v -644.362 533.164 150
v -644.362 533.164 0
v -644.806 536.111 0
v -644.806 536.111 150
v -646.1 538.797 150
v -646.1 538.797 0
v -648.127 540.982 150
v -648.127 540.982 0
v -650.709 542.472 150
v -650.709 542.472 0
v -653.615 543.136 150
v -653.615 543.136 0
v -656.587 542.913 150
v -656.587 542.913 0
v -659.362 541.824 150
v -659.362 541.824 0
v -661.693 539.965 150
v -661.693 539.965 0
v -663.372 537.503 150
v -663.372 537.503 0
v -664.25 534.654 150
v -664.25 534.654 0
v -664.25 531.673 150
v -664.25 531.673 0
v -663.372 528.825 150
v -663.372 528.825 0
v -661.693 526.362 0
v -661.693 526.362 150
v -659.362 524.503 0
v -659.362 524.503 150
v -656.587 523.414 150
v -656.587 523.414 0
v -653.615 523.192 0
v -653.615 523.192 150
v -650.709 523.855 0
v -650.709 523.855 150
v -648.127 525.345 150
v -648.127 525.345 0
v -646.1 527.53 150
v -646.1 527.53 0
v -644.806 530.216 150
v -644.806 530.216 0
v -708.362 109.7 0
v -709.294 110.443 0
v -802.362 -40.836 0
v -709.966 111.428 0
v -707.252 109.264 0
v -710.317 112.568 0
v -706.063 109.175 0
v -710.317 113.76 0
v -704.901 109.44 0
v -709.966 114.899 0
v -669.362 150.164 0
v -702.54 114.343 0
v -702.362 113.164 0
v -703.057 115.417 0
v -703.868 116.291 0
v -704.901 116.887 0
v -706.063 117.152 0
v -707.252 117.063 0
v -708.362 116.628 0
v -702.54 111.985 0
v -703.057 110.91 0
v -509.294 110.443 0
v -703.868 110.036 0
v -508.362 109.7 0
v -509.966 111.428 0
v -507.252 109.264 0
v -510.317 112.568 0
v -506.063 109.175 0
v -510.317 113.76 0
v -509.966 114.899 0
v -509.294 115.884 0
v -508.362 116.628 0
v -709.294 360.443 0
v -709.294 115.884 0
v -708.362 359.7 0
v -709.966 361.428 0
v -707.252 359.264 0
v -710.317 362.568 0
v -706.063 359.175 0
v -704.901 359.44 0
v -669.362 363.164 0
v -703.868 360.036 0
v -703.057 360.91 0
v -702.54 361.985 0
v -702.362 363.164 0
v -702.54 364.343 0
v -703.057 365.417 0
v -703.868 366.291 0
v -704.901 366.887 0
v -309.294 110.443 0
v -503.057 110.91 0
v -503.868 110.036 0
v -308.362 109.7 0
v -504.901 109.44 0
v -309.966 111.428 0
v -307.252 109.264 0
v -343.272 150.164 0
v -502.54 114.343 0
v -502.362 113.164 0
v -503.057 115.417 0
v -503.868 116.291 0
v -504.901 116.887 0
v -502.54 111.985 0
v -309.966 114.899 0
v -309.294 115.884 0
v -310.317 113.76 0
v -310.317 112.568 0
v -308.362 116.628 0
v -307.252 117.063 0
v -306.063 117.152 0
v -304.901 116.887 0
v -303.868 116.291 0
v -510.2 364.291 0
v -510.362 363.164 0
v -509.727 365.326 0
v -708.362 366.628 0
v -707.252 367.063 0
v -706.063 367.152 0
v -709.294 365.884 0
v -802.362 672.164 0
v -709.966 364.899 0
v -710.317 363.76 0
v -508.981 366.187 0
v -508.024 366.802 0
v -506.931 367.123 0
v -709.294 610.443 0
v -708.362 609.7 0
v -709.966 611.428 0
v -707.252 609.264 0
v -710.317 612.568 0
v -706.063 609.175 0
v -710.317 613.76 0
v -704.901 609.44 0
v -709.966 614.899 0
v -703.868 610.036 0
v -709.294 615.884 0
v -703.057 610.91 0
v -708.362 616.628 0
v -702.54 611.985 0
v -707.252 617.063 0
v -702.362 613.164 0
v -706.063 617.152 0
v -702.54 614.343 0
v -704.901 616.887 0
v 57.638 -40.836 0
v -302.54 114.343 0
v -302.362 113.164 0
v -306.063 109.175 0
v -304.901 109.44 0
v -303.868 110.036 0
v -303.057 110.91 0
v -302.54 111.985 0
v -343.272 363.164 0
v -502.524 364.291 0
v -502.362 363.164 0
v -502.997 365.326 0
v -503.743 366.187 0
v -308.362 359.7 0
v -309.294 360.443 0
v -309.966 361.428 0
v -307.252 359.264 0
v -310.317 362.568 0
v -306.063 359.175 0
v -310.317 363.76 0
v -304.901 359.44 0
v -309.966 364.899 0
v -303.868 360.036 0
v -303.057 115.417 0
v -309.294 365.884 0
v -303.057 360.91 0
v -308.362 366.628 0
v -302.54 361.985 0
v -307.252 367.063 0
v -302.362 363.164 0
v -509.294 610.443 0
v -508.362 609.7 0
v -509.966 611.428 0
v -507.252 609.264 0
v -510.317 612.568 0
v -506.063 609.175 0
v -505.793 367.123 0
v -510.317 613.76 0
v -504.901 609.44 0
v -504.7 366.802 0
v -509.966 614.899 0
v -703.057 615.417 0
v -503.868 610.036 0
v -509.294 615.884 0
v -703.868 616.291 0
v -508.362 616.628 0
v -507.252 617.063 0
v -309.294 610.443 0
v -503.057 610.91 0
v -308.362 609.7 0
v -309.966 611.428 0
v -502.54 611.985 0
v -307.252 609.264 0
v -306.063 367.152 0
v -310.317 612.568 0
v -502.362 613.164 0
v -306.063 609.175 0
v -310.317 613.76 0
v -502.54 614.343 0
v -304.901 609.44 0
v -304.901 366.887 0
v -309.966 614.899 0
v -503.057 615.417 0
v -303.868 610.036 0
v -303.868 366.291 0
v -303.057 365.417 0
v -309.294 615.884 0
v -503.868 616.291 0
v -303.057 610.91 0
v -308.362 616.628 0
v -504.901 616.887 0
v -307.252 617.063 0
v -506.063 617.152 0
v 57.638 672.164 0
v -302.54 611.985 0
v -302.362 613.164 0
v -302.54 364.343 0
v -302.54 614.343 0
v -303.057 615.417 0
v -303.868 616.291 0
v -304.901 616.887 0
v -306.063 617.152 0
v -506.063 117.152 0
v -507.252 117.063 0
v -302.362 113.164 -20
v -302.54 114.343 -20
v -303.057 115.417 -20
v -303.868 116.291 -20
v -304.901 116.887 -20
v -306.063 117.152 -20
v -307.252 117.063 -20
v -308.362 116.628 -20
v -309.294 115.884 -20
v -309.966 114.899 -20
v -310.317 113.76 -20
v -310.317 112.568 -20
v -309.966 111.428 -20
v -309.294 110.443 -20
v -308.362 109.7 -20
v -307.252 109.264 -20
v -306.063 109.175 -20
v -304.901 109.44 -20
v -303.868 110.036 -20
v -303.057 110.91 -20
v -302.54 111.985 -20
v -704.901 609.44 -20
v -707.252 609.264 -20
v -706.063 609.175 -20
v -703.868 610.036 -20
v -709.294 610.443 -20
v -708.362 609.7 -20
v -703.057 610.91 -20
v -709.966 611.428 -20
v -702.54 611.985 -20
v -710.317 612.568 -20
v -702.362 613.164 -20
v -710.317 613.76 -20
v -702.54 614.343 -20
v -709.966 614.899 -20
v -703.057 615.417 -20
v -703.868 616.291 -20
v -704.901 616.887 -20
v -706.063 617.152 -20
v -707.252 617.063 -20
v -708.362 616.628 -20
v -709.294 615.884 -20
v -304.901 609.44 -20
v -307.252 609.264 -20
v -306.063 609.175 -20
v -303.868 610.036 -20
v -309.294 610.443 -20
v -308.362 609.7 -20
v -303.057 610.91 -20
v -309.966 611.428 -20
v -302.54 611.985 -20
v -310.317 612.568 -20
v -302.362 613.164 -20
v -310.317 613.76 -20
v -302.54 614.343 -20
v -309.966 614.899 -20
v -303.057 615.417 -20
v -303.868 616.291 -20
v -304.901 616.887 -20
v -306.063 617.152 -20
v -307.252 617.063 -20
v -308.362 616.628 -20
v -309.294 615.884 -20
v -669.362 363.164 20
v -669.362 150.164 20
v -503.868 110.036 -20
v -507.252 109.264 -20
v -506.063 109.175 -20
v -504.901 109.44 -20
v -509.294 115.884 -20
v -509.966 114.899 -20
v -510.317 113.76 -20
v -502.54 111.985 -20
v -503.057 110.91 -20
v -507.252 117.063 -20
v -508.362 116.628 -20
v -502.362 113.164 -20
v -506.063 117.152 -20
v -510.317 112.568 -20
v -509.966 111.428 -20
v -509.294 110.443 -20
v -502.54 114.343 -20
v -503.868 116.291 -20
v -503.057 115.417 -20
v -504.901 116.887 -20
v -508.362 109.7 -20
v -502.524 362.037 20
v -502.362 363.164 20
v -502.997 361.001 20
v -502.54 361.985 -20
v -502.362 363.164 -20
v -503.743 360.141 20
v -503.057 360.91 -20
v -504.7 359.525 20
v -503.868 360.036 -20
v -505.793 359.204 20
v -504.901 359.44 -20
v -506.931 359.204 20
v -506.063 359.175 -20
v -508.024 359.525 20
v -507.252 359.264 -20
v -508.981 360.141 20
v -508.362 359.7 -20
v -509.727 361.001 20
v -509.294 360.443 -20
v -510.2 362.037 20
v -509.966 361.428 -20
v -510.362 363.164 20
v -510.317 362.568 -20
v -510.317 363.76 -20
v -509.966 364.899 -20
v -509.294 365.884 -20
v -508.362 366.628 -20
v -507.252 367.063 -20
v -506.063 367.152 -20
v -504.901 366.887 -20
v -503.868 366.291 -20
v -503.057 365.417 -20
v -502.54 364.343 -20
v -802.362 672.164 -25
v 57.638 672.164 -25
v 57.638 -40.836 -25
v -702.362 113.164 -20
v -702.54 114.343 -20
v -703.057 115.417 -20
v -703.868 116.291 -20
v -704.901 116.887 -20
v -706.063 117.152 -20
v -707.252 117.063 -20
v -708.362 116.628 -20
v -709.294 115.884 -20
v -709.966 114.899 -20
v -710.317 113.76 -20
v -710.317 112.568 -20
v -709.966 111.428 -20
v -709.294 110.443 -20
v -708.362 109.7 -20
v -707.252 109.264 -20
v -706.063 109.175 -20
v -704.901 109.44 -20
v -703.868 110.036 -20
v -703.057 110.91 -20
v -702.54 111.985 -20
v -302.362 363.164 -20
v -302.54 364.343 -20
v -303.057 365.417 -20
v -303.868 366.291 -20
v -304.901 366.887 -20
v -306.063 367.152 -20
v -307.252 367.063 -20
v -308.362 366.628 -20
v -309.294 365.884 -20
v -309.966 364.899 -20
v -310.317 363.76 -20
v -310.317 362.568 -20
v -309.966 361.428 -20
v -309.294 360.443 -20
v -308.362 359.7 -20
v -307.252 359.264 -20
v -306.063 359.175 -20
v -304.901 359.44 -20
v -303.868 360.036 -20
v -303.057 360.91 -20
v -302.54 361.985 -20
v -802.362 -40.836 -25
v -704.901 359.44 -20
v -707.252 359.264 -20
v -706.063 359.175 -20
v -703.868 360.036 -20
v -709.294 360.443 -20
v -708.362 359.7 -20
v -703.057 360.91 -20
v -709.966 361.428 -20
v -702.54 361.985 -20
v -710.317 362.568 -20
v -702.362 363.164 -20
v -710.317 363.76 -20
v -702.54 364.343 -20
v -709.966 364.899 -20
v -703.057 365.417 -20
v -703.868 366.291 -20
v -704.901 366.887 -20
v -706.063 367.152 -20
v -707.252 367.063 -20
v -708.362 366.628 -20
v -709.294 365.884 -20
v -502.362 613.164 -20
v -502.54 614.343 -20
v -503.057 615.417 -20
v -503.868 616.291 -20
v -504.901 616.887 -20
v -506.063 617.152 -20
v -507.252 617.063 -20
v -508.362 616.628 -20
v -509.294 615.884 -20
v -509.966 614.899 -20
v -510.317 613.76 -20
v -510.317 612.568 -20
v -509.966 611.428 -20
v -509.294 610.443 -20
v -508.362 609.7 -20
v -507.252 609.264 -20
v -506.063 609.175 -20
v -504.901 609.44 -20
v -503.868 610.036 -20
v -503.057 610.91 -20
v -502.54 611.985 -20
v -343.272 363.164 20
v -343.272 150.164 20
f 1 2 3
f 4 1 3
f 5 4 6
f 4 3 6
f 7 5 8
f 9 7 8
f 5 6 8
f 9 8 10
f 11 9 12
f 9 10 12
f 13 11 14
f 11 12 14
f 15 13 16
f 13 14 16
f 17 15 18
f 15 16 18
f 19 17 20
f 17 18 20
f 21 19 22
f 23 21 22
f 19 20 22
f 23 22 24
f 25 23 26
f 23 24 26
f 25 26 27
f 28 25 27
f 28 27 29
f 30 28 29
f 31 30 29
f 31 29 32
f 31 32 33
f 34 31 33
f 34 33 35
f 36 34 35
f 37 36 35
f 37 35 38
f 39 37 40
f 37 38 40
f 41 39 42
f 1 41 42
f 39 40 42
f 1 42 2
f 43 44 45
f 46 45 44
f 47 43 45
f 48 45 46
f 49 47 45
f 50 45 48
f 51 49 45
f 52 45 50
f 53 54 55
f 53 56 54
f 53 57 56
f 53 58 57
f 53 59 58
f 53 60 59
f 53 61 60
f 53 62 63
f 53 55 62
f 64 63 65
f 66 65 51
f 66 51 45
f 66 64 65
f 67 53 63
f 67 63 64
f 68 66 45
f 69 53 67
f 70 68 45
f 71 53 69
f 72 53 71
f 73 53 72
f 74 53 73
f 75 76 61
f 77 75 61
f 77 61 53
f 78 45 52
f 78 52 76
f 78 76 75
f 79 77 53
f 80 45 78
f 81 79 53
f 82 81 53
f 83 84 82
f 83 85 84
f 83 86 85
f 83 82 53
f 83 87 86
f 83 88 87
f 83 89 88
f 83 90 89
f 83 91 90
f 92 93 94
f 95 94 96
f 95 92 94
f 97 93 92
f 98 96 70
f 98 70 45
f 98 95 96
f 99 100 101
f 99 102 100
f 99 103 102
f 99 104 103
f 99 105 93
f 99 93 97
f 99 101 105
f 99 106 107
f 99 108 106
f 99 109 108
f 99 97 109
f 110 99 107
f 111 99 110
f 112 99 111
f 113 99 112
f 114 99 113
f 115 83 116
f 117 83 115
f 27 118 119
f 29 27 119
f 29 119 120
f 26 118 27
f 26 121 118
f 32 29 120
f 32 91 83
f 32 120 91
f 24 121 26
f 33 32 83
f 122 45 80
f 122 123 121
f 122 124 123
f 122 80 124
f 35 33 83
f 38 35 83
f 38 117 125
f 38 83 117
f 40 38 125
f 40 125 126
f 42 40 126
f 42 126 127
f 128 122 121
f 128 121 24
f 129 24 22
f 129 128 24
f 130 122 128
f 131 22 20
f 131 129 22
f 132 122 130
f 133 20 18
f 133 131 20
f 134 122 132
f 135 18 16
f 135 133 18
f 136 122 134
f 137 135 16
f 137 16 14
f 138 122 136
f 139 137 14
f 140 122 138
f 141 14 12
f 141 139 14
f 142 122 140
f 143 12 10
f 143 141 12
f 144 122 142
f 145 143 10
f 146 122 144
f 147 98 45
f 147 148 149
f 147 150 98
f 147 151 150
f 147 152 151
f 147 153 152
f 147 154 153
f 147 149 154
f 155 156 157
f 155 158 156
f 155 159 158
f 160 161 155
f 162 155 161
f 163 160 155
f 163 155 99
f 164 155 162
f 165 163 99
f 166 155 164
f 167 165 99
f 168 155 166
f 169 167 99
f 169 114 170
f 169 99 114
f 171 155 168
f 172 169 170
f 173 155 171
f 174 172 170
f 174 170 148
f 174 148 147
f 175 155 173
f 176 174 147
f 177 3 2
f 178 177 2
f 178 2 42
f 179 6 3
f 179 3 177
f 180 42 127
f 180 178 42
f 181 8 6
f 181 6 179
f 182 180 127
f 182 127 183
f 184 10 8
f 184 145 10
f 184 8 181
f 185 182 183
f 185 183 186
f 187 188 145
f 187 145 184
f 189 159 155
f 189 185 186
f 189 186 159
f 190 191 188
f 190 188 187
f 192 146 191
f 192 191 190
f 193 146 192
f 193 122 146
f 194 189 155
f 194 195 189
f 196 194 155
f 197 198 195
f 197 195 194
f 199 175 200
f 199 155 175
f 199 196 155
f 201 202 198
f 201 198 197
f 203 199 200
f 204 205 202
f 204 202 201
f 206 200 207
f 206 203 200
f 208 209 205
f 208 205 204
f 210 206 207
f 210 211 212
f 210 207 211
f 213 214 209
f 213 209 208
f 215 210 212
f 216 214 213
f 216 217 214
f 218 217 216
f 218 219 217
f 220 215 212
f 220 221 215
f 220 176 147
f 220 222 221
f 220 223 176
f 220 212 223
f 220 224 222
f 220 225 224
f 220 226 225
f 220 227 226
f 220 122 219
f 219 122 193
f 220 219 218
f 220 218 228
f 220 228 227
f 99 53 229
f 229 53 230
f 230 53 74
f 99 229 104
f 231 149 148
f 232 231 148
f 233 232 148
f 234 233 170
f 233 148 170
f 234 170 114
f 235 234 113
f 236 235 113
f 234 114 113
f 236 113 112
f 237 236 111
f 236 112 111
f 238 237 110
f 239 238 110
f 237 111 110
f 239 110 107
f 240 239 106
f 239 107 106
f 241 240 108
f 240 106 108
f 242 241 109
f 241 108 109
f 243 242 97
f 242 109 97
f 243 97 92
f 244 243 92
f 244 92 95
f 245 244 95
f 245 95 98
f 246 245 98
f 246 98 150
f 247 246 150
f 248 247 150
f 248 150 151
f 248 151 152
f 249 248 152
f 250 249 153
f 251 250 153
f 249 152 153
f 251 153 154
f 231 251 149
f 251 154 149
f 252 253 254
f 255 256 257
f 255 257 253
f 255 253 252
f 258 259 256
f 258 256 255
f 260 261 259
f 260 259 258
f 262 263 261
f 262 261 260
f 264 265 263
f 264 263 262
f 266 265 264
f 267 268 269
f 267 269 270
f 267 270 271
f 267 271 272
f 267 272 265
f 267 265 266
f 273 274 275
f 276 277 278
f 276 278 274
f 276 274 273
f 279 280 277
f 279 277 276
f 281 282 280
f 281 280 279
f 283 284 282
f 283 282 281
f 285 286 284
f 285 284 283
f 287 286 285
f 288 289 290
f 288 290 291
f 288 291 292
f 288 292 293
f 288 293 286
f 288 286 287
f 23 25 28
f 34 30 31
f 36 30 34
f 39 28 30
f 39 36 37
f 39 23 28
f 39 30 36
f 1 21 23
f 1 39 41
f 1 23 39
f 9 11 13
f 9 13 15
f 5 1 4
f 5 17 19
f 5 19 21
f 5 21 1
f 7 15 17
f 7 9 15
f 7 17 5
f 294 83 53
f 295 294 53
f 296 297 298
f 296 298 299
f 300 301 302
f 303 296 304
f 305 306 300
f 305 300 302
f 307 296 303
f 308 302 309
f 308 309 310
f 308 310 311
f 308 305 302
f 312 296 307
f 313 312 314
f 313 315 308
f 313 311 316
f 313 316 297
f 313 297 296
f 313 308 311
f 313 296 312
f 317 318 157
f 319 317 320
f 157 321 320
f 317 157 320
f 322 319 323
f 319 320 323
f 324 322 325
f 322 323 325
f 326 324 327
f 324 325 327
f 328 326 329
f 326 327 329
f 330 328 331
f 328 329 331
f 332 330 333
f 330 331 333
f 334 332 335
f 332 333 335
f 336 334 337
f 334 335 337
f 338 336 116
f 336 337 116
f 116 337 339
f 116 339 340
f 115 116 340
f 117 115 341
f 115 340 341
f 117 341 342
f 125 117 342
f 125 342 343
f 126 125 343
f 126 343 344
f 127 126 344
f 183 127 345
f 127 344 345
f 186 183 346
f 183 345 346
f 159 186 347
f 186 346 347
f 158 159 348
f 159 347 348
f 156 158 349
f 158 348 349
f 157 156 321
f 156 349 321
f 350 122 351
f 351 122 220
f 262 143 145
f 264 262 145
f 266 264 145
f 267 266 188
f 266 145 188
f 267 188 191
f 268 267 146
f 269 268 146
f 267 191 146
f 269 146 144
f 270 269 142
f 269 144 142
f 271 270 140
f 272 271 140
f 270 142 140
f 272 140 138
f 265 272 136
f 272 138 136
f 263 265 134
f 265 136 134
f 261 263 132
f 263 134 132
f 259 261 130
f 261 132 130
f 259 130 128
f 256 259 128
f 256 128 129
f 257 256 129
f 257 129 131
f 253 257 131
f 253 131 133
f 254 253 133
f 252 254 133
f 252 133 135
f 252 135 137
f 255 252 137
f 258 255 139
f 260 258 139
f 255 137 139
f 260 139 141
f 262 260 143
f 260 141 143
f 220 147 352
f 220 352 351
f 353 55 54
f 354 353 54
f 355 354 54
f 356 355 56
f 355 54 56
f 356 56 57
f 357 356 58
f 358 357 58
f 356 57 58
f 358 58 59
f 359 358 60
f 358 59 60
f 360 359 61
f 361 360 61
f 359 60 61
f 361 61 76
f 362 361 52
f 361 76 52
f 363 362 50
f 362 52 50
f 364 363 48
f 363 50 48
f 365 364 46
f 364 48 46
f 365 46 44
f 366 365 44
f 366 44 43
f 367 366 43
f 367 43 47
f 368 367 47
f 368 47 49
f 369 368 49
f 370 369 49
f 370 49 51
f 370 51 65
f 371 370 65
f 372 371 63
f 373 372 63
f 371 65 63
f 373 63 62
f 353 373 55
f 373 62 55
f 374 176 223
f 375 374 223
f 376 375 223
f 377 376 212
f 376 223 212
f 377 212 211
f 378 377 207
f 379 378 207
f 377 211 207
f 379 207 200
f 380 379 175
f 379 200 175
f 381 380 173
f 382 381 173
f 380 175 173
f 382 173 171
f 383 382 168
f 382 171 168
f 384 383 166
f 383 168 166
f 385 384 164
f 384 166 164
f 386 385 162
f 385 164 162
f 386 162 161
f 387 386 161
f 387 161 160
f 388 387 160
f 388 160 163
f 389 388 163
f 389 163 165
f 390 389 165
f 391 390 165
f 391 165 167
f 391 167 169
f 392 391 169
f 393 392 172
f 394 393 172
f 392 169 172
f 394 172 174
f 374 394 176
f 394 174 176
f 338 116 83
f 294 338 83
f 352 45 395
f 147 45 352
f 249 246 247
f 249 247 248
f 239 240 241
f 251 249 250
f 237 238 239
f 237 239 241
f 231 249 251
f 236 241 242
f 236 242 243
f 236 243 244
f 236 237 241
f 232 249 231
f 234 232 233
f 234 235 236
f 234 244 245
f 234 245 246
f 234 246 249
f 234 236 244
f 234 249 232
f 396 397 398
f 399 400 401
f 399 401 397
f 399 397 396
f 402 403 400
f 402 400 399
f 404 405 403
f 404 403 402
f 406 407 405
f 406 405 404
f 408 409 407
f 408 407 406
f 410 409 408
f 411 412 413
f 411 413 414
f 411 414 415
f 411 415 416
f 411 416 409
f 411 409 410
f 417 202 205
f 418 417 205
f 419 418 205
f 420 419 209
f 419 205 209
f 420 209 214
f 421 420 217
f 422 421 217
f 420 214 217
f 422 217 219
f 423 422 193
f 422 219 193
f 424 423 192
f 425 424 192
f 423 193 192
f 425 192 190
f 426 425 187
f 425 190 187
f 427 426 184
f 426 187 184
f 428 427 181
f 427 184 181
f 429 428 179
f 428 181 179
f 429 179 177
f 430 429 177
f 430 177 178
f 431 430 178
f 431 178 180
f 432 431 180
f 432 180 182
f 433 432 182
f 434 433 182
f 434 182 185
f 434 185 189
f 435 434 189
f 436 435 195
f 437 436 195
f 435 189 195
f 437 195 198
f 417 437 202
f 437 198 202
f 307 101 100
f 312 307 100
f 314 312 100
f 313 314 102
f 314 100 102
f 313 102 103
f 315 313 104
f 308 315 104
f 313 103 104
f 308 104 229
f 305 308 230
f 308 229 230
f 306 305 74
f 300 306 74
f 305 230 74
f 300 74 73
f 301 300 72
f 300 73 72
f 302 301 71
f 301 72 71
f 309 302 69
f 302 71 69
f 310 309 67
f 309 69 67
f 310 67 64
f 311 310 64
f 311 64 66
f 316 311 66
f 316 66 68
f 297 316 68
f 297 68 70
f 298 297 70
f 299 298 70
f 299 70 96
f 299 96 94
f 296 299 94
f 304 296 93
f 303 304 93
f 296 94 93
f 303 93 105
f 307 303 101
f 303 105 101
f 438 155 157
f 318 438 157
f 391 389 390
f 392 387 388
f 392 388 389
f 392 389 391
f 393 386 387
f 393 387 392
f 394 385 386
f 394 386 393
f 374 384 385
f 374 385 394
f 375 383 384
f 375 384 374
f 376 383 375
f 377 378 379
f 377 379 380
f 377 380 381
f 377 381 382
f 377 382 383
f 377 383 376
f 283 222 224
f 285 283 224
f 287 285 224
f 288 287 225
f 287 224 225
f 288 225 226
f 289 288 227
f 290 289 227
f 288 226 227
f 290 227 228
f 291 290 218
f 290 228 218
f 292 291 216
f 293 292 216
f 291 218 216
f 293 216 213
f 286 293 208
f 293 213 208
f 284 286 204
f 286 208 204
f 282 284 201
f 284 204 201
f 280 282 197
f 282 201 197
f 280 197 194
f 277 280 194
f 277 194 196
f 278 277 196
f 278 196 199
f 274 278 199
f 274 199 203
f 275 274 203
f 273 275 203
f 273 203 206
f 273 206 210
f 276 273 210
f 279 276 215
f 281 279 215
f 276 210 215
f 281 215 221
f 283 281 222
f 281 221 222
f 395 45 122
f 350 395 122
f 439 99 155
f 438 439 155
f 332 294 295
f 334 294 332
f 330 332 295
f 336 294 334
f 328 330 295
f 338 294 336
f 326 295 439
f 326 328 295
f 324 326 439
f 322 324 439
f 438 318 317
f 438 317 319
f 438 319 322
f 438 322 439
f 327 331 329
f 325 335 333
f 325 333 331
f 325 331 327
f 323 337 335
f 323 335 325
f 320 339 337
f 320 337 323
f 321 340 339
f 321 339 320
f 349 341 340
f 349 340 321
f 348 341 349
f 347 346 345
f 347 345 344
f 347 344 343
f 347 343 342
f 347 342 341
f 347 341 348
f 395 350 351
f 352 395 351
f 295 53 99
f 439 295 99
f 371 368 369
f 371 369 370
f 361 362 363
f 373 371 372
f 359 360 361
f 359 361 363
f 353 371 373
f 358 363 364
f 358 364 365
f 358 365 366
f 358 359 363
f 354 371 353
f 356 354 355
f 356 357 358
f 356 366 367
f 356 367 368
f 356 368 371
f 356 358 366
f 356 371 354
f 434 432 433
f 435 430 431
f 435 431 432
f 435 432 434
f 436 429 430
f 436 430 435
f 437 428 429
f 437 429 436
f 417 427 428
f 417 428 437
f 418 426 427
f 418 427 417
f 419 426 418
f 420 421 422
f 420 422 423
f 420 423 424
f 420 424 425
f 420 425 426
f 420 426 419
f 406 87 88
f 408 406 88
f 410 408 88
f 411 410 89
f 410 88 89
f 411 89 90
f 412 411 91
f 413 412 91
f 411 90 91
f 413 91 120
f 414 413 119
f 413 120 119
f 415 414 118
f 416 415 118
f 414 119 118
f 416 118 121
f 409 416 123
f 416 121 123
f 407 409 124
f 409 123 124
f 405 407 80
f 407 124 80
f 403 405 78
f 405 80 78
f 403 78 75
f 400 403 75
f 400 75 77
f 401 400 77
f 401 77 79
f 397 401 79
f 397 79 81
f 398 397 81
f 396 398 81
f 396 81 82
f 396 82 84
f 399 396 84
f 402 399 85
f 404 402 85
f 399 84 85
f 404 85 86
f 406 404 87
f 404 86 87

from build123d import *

# Parameters (mm, degrees)
F0_W     = 860
F0_H     = 713
F1_DEPTH = 25
F2_R     = 4
F3_DEPTH = 20
F5_DEPTH = 20
F6_R     = 10
F7_DEPTH = 150


with BuildPart() as f1:
    # F0 (on Top) → F1 (new body)
    with BuildSketch(Plane.XY):
        with Locations((-372.361999, 315.663677)):
            Rectangle(F0_W, F0_H)
    extrude(amount=-F1_DEPTH)

    # F2 (on face) → F3 (cut)
    with BuildSketch(Plane.XY):
        with Locations((-706.361999, 613.163677)):
            Circle(F2_R)
        with Locations((-506.361999, 613.163677)):
            Circle(F2_R)
        with Locations((-306.361999, 613.163677)):
            Circle(F2_R)
        with Locations((-706.361999, 363.163677)):
            Circle(F2_R)
        with Locations((-506.361999, 363.163677)):
            Circle(F2_R)
        with Locations((-306.361999, 363.163677)):
            Circle(F2_R)
        with Locations((-706.361999, 113.163677)):
            Circle(F2_R)
        with Locations((-506.361999, 113.163677)):
            Circle(F2_R)
        with Locations((-306.361999, 113.163677)):
            Circle(F2_R)
    extrude(amount=-F3_DEPTH, mode=Mode.SUBTRACT)

    # F4 (on face) → F5 (join)
    with BuildSketch(Plane.XY):
        with BuildLine():
            Line((-669.361999, 363.163677), (-669.361999, 150.163677))
            Line((-669.361999, 150.163677), (-343.272001, 150.163677))
            Line((-343.272001, 150.163677), (-343.272001, 363.163677))
            Line((-343.272001, 363.163677), (-502.361999, 363.163677))
            ThreePointArc((-502.361999, 363.163677), (-506.361999, 359.163677), (-510.361999, 363.163677))
            Line((-510.361999, 363.163677), (-669.361999, 363.163677))
        make_face()
    extrude(amount=F5_DEPTH)

    # F6 (on face) → F7 (join)
    with BuildSketch(Plane.XY):
        with Locations((-654.361999, 533.163677)):
            Circle(F6_R)
    extrude(amount=F7_DEPTH)


solid = f1.part
